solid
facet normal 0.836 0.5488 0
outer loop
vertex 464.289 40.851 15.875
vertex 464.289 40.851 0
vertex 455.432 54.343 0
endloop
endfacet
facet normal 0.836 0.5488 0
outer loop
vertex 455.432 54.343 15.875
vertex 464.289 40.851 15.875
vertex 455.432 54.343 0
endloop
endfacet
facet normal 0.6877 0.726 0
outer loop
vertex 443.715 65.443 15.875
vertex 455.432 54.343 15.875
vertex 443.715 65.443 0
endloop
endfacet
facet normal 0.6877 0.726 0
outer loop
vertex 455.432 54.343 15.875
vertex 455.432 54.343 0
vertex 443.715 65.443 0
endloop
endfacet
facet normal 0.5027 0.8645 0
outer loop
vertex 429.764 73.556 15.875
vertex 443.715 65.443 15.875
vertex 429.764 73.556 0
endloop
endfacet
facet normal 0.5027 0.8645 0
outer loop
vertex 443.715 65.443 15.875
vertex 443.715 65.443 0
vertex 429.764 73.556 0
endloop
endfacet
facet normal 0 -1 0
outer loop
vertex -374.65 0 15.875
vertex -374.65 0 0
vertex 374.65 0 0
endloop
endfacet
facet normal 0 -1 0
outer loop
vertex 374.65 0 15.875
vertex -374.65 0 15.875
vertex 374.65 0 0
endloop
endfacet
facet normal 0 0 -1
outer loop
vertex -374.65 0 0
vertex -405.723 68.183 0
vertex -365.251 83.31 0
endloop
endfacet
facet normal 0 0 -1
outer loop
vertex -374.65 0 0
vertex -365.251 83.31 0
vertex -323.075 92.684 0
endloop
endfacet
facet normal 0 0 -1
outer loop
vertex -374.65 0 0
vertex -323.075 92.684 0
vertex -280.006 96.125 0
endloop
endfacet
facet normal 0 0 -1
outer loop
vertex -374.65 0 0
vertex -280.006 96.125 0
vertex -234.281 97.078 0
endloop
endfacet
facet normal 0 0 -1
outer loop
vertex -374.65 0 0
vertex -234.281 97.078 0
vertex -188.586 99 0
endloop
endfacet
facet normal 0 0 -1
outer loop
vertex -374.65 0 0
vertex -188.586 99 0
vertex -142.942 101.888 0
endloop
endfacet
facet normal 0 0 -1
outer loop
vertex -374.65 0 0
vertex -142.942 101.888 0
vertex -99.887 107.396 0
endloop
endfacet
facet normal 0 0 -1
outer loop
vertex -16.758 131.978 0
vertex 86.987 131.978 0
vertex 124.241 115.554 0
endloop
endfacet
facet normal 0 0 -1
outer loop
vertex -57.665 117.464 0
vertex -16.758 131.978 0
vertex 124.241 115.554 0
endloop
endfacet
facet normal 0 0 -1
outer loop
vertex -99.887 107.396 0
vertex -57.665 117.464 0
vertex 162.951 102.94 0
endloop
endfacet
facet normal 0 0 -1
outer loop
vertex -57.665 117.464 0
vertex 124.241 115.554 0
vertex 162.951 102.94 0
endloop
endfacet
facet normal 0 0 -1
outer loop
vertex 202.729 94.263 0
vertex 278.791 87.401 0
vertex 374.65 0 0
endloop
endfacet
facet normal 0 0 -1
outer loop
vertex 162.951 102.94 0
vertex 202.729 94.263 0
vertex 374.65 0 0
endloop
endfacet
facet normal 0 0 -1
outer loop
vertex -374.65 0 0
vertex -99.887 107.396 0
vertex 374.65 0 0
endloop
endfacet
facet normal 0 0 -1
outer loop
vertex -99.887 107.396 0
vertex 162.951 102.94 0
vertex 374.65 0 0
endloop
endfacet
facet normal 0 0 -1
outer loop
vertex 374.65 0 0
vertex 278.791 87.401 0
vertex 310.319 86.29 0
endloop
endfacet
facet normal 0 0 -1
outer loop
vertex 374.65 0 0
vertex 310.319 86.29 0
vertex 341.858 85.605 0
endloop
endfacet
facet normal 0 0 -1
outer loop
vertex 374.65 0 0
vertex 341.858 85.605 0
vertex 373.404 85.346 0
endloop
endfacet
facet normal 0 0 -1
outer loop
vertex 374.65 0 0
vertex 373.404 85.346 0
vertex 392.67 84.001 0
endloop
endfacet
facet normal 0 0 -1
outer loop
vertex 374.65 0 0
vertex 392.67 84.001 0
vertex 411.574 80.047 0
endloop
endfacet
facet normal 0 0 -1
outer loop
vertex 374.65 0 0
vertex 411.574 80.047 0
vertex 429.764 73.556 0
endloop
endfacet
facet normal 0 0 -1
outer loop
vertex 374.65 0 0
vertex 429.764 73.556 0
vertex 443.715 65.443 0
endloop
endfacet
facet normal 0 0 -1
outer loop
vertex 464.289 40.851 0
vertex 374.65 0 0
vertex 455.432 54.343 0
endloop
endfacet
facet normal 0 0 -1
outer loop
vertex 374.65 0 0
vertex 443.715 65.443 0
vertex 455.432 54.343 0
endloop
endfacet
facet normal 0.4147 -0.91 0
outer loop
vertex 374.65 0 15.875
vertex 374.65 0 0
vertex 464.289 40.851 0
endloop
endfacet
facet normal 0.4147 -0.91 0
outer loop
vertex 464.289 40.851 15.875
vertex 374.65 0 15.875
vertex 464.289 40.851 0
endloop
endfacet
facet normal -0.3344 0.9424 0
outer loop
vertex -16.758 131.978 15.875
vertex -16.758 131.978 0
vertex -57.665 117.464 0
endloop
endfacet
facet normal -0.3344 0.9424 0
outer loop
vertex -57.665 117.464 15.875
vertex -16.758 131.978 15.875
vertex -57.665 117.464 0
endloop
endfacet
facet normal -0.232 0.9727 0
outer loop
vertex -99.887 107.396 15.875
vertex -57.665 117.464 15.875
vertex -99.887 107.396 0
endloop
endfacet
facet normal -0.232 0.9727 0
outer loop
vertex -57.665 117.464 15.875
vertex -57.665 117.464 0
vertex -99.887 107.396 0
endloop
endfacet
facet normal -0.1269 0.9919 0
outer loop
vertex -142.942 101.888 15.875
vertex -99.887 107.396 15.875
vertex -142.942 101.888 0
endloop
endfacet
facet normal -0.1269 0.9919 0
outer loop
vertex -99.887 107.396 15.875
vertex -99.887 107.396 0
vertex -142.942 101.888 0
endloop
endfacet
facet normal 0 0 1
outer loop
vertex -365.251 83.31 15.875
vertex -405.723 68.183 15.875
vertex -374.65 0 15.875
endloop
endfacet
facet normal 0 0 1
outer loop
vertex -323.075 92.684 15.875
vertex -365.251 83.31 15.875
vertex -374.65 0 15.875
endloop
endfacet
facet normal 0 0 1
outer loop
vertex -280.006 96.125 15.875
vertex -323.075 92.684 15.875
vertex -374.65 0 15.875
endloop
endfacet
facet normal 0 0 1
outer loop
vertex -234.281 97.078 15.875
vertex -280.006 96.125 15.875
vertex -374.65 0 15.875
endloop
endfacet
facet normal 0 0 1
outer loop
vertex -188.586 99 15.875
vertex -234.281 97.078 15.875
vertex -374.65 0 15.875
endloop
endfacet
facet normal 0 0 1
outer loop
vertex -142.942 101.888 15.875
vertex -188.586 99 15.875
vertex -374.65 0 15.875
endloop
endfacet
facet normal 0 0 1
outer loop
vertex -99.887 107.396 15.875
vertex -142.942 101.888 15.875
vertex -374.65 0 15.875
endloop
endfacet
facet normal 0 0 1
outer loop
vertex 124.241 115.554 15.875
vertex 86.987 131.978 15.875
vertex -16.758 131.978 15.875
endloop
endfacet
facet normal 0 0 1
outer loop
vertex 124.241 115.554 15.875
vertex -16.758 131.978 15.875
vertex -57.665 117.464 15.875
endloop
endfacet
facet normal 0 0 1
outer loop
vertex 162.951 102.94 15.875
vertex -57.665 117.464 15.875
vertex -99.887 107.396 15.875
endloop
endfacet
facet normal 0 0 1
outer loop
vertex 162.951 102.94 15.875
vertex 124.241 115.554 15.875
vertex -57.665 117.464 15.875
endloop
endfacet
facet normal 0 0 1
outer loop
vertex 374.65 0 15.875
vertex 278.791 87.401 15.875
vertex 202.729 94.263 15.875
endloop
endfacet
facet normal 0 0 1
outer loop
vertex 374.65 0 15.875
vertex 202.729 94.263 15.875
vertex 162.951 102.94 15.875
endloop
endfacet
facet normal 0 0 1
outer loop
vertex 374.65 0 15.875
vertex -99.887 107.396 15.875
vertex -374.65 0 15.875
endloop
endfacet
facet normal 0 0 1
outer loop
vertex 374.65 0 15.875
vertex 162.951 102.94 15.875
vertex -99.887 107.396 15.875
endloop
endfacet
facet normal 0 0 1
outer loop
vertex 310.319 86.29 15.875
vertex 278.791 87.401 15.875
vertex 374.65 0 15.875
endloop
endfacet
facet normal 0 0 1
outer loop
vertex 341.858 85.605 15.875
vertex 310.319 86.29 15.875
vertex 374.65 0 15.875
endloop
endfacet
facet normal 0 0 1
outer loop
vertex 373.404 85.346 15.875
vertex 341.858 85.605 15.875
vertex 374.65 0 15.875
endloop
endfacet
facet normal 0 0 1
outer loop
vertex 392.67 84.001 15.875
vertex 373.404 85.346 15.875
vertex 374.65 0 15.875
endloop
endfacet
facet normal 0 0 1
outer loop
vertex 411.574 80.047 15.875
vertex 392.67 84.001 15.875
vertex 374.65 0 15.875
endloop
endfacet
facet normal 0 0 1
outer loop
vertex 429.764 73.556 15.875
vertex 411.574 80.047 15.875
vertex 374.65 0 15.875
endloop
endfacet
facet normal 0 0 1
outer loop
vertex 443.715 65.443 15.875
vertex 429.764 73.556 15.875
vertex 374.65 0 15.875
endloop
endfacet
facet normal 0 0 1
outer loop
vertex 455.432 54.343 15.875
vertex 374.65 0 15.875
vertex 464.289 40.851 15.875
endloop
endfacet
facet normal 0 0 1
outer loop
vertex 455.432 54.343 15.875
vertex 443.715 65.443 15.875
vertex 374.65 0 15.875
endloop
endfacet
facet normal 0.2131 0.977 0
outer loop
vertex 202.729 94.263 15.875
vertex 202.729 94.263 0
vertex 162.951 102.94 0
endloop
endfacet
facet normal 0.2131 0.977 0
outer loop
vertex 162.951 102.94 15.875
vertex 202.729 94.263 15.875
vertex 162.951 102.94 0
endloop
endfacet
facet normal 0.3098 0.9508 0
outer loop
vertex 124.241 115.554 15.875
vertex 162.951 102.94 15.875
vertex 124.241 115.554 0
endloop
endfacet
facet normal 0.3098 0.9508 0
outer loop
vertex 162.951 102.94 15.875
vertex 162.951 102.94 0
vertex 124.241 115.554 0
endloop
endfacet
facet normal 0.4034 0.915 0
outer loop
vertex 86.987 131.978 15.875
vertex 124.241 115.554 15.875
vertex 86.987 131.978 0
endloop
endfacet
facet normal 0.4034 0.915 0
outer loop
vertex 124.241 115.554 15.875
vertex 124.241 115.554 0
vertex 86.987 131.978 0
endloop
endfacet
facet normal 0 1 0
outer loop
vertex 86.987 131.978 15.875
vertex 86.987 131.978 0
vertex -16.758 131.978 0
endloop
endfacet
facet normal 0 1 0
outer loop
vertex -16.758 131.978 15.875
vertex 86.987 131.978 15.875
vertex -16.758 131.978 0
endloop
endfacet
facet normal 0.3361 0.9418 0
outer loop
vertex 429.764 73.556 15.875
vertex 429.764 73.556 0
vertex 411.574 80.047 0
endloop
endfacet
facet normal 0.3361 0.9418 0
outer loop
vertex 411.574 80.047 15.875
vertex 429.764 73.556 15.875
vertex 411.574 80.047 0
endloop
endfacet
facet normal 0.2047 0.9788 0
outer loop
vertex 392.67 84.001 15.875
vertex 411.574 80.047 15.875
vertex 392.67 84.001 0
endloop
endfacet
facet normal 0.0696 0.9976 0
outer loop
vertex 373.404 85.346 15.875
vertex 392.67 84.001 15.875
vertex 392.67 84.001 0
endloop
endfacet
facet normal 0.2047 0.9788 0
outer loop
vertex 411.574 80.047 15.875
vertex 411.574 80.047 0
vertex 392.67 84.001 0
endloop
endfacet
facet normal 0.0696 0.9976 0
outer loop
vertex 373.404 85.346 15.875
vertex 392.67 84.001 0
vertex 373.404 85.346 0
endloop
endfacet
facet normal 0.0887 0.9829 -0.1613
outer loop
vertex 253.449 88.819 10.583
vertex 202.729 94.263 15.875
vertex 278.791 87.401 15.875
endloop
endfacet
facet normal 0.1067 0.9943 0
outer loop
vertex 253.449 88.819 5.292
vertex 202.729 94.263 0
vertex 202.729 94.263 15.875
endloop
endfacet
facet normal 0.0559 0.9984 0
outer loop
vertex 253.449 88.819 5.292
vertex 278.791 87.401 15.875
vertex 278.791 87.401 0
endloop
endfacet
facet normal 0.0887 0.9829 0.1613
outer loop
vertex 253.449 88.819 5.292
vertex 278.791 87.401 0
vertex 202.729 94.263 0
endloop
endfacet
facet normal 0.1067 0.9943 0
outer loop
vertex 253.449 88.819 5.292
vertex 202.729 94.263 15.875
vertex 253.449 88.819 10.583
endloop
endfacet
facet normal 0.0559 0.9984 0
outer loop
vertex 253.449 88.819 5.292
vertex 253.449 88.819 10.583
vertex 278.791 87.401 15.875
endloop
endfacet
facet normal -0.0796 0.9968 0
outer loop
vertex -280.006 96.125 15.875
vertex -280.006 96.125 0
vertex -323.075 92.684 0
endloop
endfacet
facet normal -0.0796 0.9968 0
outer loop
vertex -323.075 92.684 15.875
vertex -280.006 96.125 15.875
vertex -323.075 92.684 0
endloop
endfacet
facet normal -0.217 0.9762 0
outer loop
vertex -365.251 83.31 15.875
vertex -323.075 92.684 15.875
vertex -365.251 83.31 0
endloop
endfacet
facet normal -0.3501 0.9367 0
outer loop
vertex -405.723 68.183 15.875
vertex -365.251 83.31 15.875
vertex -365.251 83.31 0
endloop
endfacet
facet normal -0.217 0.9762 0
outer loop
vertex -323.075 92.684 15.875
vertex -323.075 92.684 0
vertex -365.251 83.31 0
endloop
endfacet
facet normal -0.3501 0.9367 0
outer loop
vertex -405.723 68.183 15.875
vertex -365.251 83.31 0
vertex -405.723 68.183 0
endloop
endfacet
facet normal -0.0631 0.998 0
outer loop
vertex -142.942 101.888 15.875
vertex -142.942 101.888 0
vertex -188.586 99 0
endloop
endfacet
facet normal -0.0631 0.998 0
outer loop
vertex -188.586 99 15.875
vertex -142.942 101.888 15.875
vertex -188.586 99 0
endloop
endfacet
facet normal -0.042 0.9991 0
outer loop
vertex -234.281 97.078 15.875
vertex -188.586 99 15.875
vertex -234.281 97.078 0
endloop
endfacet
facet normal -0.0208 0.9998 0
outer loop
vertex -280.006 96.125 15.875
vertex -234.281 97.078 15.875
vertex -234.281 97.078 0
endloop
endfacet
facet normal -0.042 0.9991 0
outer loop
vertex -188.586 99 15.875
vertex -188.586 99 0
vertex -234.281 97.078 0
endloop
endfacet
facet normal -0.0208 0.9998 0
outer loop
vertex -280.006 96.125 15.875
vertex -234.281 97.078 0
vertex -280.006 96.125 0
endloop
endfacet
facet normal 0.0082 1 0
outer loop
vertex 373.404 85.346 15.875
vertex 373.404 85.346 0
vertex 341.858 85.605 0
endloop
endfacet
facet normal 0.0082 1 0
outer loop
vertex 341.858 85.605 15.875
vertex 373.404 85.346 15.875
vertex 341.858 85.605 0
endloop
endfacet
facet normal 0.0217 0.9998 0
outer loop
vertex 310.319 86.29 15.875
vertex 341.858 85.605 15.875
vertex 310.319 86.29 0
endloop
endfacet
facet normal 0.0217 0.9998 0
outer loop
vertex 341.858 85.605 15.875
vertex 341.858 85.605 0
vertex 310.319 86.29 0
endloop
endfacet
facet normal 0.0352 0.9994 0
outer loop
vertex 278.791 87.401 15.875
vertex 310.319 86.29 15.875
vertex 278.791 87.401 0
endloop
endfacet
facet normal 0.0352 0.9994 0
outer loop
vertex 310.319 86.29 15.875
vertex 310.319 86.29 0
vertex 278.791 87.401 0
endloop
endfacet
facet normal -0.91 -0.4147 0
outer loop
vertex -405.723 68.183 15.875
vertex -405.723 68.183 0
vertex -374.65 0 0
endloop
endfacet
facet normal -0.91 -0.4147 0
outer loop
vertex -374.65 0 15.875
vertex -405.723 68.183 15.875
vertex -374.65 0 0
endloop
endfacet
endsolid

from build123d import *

# Parameters (mm, degrees)
F1_DEPTH = 15.875


with BuildPart() as f1:
    # F0 (on Top) → F1 (new body)
    with BuildSketch(Plane.XY):
        with BuildLine():
            Line((-405.7229646722, 68.1833980268), (-374.65, 0))
            Line((-374.65, 0), (374.65, 0))
            Line((374.65, 0), (464.2890758153, 40.8508803707))
            ThreePointArc((464.2890758153, 40.8508803707), (449.8955253775, 60.2323726334), (429.7637939453, 73.5564082861))
            ThreePointArc((429.7637939453, 73.5564082861), (402.1894850495, 82.3465161995), (373.4039068222, 85.3463485836))
            ThreePointArc((373.4039068222, 85.3463485837), (326.0872814579, 85.8945342918), (278.7914574146, 87.4007120728))
            add(Edge.make_bspline(
                [(202.7294188738, 94.2631438375), (213.246380745, 92.4749947437), (228.4808446175, 90.7466252174), (253.242470606, 88.7234669698), (271.076796222, 87.7246110844), (278.7914574146, 87.4007120728)],
                knots=[0, 0, 0, 0, 0.3410495495, 0.6671789133, 1, 1, 1, 1], degree=3))
            ThreePointArc((202.7294188738, 94.2631438375), (143.4379350037, 108.7622570813), (86.986720562, 131.9778710604))
            Line((86.986720562, 131.9778710604), (-16.7578142136, 131.9778710604))
            ThreePointArc((-16.7578142136, 131.9778710604), (-78.6416708287, 111.865947388), (-142.9421407222, 101.8884349303))
            ThreePointArc((-142.9421407222, 101.8884349303), (-211.4284268901, 97.9178060181), (-280.0062894821, 96.1250290275))
            ThreePointArc((-280.0062894821, 96.1250290275), (-344.3260692988, 88.7296227106), (-405.7229646722, 68.1833980268))
        make_face()
    extrude(amount=F1_DEPTH)


solid = f1.part
